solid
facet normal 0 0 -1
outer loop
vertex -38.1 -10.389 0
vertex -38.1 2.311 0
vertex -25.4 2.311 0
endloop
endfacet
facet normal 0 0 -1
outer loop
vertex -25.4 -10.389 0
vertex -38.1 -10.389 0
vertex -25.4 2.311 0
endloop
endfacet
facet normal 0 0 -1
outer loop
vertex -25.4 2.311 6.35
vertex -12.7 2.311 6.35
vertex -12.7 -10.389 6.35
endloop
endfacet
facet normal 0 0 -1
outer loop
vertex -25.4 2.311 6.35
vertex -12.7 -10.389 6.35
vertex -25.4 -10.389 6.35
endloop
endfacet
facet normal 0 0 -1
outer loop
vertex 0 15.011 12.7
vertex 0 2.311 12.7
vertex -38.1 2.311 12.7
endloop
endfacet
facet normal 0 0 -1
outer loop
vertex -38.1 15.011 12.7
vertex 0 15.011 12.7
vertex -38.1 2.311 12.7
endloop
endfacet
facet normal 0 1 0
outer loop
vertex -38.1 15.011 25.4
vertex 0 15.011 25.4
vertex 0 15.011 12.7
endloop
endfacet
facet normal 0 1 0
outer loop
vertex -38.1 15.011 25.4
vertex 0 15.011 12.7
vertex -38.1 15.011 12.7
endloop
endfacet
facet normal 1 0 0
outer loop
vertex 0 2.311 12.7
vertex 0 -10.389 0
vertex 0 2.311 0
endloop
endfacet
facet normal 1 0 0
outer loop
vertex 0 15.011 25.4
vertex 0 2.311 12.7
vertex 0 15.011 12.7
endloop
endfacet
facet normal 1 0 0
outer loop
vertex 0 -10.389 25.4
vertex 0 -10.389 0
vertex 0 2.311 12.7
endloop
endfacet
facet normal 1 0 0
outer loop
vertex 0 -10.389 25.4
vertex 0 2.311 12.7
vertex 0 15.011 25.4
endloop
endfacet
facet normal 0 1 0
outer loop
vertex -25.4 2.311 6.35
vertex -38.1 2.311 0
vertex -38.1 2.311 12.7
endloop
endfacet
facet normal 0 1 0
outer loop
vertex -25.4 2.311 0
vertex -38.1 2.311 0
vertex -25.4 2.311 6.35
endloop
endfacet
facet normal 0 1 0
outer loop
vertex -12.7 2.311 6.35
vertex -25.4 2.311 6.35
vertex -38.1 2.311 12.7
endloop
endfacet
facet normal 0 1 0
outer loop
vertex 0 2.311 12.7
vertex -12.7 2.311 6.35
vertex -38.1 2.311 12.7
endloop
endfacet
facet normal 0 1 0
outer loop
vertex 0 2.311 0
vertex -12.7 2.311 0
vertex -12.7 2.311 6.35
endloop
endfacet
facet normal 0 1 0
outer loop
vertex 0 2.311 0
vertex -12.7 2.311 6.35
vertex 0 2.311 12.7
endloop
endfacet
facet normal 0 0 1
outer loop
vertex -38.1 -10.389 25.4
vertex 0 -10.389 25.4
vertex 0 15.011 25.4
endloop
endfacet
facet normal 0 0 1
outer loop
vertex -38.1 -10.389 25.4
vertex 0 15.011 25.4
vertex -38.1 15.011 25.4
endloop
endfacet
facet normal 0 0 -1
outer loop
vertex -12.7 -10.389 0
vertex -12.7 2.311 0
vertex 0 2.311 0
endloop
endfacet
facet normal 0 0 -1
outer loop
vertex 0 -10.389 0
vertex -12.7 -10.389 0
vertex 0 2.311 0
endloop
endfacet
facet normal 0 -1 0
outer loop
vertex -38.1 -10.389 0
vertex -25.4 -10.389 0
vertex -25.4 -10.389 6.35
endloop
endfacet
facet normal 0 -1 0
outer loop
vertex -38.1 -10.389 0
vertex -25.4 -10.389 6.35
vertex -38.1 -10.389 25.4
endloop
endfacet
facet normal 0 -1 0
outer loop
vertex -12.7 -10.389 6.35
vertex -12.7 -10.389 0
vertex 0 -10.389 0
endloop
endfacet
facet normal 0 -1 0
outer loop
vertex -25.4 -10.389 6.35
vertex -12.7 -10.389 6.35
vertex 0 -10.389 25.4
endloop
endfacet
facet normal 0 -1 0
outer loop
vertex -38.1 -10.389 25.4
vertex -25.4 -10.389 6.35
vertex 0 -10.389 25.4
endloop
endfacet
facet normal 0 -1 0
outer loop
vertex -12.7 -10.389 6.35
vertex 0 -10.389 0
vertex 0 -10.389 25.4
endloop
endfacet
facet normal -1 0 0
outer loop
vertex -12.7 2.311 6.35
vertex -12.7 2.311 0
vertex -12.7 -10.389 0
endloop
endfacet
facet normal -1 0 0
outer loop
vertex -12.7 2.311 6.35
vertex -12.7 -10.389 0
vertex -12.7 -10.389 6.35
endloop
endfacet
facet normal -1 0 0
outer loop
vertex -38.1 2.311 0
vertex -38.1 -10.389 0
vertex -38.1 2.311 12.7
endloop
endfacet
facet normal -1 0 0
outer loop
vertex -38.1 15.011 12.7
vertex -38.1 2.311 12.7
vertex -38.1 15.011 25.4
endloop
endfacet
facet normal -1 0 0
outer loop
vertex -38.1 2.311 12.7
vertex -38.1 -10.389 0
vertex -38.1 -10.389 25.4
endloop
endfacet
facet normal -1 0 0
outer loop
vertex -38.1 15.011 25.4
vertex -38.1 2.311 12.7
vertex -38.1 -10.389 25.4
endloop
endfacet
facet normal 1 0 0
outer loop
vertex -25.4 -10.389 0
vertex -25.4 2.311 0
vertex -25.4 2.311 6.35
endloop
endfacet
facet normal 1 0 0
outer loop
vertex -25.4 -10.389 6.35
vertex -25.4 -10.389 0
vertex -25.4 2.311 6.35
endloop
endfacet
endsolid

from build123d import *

# Parameters (mm, degrees)
F0_W      = 38.1
F0_H      = 25.4
F1_DEPTH  = 31.75
F2_W      = 19.05
F2_H      = 12.7
F3_DEPTH  = 25.4
F4_W      = 12.7
F4_H      = 6.35
F5_DEPTH  = 25.4
F6_DEPTH  = 19.05
F7_W      = 12.7
F7_H      = 12.7
F8_DEPTH  = 25.4
F9_W      = 12.7
F9_H      = 12.7
F10_DEPTH = 25.4
F11_W     = 12.7
F11_H     = 12.7
F12_DEPTH = 25.4
F13_W     = 38.1
F13_H     = 12.7
F14_DEPTH = 12.7


with BuildPart() as f1:
    # F0 (on Top) → F1 (new body)
    with BuildSketch(Plane.XY):
        with Locations((-19.05, 2.3111041307)):
            Rectangle(F0_W, F0_H)
    extrude(amount=F1_DEPTH)

    # F2 (on face) → F3 (cut)
    with BuildSketch(Plane.XZ.offset(10.3888958693)):
        Polygon((-38.1, 31.75), (-38.1, 25.4), (-19.05, 25.4), (0, 25.4), (0, 31.75), align=None)
        with Locations((-28.575, 19.05)):
            Rectangle(F2_W, F2_H)
    extrude(amount=-F3_DEPTH, mode=Mode.SUBTRACT)

    # F4 (on face) → F5 (cut)
    with BuildSketch(Plane(origin=(0, 15.0111041307, 0), x_dir=(-1, 0, 0), z_dir=(0, 1, 0))):
        with Locations((19.05, 3.175)):
            Rectangle(F4_W, F4_H)
    extrude(amount=-F5_DEPTH, mode=Mode.SUBTRACT)

    # F6 (add): a face of the model
    f6_faces = [f1.faces().sort_by_distance(p)[0] for p in [
        (-19.05, 2.3111041307, 19.05),
    ]]
    extrude(f6_faces, amount=F6_DEPTH)

    # F7 (on face) → F8 (cut)
    with BuildSketch(Plane(origin=(0, 0, 0), x_dir=(1, 0, 0), z_dir=(0, 0, -1))):
        with Locations((-31.75, -8.6611041307)):
            Rectangle(F7_W, F7_H)
    extrude(amount=-F8_DEPTH, mode=Mode.SUBTRACT)

    # F9 (on face) → F10 (cut)
    with BuildSketch(Plane(origin=(0, 0, 0), x_dir=(1, 0, 0), z_dir=(0, 0, -1))):
        with Locations((-6.35, -8.6611041307)):
            Rectangle(F9_W, F9_H)
    extrude(amount=-F10_DEPTH, mode=Mode.SUBTRACT)

    # F11 (on face) → F12 (cut)
    with BuildSketch(Plane(origin=(0, 0, 6.35), x_dir=(1, 0, 0), z_dir=(0, 0, -1))):
        with Locations((-19.05, -8.6611041307)):
            Rectangle(F11_W, F11_H)
    extrude(amount=-F12_DEPTH, mode=Mode.SUBTRACT)

    # F13 (on face) → F14 (join)
    with BuildSketch(Plane(origin=(0, 2.3111041307, 0), x_dir=(-1, 0, 0), z_dir=(0, 1, 0))):
        with Locations((19.05, 19.05)):
            Rectangle(F13_W, F13_H)
    extrude(amount=F14_DEPTH)


solid = f1.part
